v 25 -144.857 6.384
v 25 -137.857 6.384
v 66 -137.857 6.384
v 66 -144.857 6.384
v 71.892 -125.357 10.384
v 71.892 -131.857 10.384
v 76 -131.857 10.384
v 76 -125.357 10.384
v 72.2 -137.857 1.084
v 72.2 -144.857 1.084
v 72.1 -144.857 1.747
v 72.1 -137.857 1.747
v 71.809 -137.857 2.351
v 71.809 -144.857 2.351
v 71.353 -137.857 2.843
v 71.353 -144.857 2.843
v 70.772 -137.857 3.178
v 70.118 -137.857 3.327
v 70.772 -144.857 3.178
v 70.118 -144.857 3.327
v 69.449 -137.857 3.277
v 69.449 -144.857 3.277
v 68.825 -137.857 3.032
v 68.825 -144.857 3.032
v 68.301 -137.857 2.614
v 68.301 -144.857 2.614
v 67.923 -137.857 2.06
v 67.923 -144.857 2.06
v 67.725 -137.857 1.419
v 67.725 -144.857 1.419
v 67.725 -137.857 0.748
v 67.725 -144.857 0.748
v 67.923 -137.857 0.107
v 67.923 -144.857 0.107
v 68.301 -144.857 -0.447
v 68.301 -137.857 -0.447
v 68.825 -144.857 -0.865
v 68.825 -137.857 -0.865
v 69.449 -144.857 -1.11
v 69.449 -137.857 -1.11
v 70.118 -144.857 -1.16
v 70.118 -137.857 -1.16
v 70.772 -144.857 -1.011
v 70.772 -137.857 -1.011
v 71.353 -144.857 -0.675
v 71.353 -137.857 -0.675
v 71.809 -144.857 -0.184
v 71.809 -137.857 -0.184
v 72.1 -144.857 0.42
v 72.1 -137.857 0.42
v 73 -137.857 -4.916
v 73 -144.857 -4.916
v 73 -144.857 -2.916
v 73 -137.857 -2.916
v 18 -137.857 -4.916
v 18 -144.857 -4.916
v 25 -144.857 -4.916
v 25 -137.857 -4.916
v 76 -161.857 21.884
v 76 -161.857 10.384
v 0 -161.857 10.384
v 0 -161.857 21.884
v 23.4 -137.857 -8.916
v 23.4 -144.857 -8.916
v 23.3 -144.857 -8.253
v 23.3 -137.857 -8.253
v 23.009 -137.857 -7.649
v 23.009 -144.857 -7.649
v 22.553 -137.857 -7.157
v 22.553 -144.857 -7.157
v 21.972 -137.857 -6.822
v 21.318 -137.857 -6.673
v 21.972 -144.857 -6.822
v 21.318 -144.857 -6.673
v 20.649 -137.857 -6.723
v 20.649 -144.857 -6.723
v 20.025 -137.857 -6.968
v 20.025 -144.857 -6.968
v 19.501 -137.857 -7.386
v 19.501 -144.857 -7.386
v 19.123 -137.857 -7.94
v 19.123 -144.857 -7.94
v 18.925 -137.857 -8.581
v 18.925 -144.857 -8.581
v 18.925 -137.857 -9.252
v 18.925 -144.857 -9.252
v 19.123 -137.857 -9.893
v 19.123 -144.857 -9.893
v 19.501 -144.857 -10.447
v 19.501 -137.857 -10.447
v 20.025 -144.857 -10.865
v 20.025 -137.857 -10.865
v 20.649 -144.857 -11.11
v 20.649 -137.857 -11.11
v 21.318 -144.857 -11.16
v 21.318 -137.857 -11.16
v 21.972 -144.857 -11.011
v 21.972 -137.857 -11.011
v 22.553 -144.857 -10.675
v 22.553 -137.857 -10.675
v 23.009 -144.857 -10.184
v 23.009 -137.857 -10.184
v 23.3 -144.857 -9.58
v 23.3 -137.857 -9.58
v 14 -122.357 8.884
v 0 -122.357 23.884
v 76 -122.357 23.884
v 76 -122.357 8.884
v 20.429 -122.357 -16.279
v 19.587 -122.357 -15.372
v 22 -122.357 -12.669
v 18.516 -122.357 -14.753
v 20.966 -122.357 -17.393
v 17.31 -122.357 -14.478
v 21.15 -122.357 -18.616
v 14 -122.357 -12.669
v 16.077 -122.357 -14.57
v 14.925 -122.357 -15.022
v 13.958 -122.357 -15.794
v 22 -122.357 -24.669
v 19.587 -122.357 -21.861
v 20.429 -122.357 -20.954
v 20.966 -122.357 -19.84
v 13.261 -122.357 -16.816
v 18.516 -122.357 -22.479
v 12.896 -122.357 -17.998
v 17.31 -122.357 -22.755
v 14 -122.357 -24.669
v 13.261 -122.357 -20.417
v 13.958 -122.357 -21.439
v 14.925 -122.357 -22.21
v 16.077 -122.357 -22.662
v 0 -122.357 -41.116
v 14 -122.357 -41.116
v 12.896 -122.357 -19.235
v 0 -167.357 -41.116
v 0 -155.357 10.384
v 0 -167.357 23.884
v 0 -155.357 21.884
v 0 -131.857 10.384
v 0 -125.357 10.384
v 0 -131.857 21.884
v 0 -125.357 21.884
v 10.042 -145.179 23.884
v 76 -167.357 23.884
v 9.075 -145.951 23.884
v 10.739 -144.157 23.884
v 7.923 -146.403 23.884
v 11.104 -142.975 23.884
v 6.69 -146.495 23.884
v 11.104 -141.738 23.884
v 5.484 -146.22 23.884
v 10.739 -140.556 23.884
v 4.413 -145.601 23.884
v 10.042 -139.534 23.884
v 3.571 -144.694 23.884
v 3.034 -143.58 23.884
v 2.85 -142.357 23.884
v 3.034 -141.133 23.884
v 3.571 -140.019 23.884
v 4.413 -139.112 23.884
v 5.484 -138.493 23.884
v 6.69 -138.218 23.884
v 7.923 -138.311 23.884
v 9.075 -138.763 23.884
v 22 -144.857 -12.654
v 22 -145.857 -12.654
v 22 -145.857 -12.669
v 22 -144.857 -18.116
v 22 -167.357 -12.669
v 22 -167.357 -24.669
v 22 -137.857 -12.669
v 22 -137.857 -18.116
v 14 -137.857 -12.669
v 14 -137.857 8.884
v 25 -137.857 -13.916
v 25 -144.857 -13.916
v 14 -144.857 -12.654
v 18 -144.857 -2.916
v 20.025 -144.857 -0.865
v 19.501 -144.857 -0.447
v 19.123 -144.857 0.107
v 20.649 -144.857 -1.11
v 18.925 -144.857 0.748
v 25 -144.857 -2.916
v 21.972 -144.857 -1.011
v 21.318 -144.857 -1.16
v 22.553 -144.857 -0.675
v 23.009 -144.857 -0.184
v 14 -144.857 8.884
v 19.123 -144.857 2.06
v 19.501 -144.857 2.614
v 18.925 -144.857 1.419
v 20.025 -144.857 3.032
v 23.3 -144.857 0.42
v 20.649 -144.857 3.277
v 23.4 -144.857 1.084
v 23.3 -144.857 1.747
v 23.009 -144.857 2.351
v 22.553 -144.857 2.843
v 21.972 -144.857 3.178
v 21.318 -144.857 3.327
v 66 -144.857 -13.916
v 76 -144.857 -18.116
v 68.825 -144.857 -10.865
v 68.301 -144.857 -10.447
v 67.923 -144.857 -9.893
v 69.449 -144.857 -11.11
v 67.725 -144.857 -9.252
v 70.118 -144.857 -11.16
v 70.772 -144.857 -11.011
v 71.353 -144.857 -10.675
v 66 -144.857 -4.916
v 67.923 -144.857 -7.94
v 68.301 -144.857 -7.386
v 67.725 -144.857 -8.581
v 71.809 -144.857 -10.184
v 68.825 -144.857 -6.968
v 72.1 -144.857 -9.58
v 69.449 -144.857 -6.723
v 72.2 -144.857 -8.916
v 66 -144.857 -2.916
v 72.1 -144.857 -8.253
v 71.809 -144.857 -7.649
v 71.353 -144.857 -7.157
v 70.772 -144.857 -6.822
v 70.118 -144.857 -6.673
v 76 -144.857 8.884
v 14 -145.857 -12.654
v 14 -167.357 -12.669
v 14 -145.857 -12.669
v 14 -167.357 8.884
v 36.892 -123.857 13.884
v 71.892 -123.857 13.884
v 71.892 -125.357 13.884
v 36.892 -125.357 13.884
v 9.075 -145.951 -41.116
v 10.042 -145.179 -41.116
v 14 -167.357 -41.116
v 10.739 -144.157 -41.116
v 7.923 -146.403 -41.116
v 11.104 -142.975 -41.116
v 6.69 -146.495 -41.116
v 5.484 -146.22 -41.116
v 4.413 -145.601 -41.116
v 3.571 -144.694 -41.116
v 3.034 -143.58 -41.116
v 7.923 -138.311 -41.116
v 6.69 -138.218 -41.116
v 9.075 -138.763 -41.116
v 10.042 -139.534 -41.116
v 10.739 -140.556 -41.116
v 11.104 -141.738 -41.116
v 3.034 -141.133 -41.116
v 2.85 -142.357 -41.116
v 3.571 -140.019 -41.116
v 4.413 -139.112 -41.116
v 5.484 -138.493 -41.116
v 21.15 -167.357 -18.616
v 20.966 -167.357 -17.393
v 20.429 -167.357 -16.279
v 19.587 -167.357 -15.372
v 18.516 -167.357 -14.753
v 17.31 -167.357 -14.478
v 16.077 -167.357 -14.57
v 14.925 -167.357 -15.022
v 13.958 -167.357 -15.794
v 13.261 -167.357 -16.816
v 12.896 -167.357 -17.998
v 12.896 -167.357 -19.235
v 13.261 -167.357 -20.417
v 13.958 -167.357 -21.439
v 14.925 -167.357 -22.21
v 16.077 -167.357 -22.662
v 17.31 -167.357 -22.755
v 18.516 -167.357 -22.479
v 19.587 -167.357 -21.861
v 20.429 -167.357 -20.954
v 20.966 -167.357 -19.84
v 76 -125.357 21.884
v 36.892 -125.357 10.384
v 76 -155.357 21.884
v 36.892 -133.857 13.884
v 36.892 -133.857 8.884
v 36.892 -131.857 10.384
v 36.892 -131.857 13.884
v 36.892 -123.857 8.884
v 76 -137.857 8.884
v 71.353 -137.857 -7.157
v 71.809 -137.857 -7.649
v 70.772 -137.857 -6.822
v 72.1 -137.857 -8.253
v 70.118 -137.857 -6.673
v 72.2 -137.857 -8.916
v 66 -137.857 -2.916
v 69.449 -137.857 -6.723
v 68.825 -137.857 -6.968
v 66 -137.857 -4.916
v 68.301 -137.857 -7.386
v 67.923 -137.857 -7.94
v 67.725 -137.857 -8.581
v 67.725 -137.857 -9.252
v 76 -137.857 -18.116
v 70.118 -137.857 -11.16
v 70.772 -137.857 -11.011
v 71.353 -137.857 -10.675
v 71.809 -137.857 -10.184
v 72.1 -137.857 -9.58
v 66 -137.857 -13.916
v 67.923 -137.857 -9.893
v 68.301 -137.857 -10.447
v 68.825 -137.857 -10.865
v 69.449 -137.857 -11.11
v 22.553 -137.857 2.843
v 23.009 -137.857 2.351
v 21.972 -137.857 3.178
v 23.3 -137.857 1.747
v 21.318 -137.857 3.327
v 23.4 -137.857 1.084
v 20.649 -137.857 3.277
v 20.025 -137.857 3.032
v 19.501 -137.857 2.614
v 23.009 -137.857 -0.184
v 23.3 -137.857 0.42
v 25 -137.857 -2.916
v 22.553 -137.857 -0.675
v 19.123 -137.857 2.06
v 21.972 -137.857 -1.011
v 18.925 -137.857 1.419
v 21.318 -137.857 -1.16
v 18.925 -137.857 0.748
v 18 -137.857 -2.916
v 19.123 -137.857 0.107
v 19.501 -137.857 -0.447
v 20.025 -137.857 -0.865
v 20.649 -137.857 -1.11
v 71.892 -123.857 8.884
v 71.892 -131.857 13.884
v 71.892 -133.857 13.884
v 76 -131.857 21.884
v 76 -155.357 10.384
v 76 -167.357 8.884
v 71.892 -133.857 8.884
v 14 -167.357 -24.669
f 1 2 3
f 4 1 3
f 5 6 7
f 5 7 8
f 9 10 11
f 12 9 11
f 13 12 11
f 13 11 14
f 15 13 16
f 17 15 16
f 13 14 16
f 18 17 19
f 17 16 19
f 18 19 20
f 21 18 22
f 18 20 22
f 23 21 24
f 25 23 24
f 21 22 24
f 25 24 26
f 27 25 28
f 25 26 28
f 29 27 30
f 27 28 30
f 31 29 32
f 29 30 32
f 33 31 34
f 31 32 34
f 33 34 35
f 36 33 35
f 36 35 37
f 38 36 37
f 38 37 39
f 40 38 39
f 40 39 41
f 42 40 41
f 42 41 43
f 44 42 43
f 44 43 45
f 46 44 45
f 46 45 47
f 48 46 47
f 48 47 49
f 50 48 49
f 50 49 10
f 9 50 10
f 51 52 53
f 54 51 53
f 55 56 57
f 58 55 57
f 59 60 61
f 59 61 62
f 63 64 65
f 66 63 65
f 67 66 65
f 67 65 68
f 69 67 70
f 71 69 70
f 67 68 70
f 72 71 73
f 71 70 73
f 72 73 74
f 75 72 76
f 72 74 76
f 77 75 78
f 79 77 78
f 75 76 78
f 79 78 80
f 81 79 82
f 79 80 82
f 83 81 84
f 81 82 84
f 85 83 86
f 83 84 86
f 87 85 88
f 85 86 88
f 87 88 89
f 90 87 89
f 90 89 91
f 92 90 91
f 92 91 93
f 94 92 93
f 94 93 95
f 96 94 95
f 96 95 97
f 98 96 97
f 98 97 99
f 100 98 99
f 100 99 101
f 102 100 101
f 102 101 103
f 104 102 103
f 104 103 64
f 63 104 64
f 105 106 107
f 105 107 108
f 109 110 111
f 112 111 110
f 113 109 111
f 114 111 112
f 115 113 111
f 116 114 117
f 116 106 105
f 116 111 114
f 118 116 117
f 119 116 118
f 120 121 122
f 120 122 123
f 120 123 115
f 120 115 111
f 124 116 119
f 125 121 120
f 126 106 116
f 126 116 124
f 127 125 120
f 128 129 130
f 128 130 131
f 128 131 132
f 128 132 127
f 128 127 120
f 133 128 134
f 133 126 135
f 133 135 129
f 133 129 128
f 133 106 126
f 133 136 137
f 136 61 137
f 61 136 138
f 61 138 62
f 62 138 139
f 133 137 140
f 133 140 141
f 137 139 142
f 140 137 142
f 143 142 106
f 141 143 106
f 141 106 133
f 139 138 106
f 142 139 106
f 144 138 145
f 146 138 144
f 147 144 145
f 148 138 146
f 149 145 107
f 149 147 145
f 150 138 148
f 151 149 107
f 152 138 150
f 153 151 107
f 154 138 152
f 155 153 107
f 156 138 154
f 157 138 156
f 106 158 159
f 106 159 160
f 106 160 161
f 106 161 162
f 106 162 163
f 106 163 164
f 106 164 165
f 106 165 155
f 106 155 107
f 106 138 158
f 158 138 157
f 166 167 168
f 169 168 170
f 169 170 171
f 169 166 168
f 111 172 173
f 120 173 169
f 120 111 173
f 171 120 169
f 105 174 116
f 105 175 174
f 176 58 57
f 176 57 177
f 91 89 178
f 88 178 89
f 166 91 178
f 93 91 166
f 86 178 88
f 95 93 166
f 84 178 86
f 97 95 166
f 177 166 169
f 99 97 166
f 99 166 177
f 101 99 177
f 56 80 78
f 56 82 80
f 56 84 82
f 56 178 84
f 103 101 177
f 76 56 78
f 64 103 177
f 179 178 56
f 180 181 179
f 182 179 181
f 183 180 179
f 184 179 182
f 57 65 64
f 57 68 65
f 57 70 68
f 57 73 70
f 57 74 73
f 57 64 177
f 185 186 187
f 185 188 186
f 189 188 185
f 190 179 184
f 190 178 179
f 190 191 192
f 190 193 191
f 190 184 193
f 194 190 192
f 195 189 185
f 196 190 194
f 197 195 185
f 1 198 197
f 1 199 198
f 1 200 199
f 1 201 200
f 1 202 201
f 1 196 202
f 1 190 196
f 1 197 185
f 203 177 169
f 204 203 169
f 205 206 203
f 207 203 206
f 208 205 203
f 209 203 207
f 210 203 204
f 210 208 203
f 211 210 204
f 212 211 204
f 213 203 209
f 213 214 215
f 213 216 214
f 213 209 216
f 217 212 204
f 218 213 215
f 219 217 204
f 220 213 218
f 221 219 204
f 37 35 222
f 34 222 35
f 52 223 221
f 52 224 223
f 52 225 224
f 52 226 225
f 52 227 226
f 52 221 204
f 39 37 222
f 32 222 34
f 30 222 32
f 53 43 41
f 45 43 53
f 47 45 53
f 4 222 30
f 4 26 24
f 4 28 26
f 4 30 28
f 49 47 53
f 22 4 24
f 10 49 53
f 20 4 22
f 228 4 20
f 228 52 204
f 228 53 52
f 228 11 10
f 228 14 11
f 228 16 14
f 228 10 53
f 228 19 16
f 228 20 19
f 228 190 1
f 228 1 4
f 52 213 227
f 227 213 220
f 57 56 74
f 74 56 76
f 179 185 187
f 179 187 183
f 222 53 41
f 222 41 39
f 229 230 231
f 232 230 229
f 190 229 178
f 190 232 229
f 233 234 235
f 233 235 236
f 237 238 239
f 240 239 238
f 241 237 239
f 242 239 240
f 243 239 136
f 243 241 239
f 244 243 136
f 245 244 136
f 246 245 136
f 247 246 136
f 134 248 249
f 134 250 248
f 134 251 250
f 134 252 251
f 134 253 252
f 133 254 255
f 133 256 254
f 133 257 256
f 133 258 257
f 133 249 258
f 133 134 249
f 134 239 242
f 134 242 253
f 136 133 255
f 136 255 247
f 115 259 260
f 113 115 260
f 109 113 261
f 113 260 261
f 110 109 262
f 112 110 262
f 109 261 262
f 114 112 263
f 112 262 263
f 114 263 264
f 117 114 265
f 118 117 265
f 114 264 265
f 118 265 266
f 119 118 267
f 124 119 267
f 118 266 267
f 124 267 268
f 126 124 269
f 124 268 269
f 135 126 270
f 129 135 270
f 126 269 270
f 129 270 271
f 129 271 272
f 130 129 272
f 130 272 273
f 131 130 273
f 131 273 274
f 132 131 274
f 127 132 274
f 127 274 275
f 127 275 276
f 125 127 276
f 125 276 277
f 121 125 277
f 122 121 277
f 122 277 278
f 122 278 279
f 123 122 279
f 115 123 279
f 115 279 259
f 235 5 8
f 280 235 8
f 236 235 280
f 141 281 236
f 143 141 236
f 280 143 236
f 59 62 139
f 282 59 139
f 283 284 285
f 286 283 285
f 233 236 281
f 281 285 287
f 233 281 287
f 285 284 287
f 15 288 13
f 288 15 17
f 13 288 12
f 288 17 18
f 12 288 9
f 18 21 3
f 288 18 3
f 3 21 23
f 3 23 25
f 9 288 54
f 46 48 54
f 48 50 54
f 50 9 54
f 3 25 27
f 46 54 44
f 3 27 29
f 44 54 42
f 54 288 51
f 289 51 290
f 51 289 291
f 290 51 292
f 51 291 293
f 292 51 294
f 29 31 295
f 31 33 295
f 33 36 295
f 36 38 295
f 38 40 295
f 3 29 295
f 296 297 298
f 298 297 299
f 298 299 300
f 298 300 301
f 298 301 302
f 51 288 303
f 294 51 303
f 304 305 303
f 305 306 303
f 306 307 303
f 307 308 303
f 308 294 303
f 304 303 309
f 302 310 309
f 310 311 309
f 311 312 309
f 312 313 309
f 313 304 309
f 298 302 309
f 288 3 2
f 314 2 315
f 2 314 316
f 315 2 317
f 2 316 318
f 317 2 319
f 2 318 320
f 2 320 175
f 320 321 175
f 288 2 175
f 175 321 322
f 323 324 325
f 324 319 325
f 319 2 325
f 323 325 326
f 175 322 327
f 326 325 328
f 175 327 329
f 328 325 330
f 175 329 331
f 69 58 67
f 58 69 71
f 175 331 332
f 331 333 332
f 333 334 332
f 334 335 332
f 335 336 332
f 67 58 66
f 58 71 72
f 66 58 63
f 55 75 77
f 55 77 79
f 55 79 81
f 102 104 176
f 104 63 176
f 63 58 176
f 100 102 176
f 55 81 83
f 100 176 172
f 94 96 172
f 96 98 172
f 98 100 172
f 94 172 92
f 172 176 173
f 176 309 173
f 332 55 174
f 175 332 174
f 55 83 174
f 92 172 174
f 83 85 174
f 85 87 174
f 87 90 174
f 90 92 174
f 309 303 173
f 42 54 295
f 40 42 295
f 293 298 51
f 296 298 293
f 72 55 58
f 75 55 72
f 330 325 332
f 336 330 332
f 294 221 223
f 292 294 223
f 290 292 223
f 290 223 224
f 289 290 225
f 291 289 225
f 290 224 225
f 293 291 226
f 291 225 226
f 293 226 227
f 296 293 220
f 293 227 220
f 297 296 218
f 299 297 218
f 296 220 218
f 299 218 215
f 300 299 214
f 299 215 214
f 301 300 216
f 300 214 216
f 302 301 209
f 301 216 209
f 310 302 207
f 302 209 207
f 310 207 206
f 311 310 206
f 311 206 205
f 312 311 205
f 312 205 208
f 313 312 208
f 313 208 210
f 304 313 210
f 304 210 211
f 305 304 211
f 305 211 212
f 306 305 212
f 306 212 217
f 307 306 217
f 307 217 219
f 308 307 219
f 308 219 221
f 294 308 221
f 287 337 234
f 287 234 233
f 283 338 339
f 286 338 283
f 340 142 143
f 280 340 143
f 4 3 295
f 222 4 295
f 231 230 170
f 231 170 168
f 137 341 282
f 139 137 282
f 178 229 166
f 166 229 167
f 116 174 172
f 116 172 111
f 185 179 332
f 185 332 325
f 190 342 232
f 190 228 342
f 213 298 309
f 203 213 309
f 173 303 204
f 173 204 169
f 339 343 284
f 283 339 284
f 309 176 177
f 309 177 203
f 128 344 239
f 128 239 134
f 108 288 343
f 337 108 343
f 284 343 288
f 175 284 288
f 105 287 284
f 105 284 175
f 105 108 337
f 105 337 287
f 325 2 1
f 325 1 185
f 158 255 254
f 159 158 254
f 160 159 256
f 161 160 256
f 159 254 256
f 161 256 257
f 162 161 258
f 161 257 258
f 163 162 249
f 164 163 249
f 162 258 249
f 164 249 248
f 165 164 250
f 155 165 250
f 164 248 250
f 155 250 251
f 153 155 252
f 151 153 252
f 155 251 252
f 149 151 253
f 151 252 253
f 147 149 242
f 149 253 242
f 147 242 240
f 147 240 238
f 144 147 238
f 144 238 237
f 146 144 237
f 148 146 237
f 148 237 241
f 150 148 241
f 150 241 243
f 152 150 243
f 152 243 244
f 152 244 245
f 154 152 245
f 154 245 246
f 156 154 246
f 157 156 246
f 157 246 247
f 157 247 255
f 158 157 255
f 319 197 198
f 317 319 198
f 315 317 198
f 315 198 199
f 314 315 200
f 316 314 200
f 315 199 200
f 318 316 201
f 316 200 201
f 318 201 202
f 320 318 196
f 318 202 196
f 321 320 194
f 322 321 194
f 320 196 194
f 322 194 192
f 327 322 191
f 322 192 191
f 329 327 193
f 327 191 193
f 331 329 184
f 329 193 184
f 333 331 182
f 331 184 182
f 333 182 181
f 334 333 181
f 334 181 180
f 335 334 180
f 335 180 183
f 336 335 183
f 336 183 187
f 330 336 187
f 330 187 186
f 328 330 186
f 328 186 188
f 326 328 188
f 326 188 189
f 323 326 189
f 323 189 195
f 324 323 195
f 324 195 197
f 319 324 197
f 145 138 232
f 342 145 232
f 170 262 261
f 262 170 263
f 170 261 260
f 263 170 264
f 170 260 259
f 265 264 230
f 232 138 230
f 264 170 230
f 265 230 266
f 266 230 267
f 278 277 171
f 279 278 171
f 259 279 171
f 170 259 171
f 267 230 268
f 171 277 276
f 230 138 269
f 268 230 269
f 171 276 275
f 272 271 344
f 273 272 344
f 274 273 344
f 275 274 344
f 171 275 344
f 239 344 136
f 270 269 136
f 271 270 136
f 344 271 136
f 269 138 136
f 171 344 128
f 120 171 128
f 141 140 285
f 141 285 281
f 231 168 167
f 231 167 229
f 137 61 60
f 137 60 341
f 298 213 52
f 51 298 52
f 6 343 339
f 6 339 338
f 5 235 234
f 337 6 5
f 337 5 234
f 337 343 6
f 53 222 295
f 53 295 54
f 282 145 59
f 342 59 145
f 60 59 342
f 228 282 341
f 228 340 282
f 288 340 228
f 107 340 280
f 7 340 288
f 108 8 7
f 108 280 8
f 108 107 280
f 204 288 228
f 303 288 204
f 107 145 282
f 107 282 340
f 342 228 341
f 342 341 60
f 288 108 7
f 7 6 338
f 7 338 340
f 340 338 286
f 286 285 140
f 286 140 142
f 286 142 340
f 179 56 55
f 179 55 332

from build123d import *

# Parameters (mm, degrees)
SKETCH_1_W           = 45
SKETCH_1_H           = 45
EXTRUDE_1_DEPTH      = 100
SKETCH_2_OUTSIDE_W   = 125.706
SKETCH_2_OUTSIDE_H   = 70.706
SKETCH_2_OUTSIDE_W_2 = 62
SKETCH_2_OUTSIDE_H_2 = 8
CUT_EXTRUDE_1_DEPTH  = 30
SKETCH_3_W           = 41
SKETCH_3_H           = 20.3
CUT_EXTRUDE_2_DEPTH  = 30.5
SKETCH_5_W           = 11.5
SKETCH_5_H           = 6.5
CUT_EXTRUDE_3_DEPTH  = 101
SKETCH_7_R           = 2.25
SKETCH_7_W           = 7
SKETCH_7_H           = 2
CUT_EXTRUDE_5_DEPTH  = 10
SKETCH_9_W           = 62
SKETCH_9_H           = 8
CUT_EXTRUDE_7_DEPTH  = 3
SKETCH_10_W          = 15
SKETCH_10_H          = 45
CUT_EXTRUDE_8_DEPTH  = 24
SKETCH_13_W          = 14
SKETCH_13_H          = 45
EXTRUDE_3_DEPTH      = 50
SKETCH_14_R          = 4.15
CUT_EXTRUDE_9_DEPTH  = 66
SKETCH_15_W          = 12
SKETCH_15_H          = 45
EXTRUDE_4_DEPTH      = 8
SKETCH_17_R          = 4.15
CUT_EXTRUDE_11_DEPTH = 46
SKETCH_8_W           = 35
SKETCH_8_H           = 10
CUT_EXTRUDE_12_DEPTH = 5
CUT_EXTRUDE_14_DEPTH = 1


with BuildPart() as part:
    # 草图1 → 凸台-拉伸1 (new body)
    with BuildSketch(Plane(origin=(0, 0, 0), x_dir=(0, 0, -1), z_dir=(1, 0, 0))):
        with Locations((-1.383662758, -144.856597142)):
            Rectangle(SKETCH_1_W, SKETCH_1_H)
    extrude(amount=EXTRUDE_1_DEPTH)

    # 草图2 outside → 切除-拉伸1 (cut)
    with BuildSketch(Plane(origin=(0, 0, -21.116337242), x_dir=(-1, 0, 0), z_dir=(0, 0, -1))):
        with Locations((-50, -144.857)):
            Rectangle(SKETCH_2_OUTSIDE_W, SKETCH_2_OUTSIDE_H)
        with Locations((-45, -141.856597142)):
            Rectangle(SKETCH_2_OUTSIDE_W_2, SKETCH_2_OUTSIDE_H_2, mode=Mode.SUBTRACT)
    extrude(amount=-CUT_EXTRUDE_1_DEPTH, mode=Mode.SUBTRACT)

    # 草图3 → 切除-拉伸2 (cut, through all)
    with BuildSketch(Plane(origin=(0, -137.856597142, 0), x_dir=(1, 0, 0), z_dir=(0, 1, 0))):
        with Locations((45.5, 3.766337242)):
            Rectangle(SKETCH_3_W, SKETCH_3_H)
    extrude(amount=-CUT_EXTRUDE_2_DEPTH, mode=Mode.SUBTRACT)

    # 草图5 → 切除-拉伸3 (cut, through all)
    with BuildSketch(Plane.ZY):
        with Locations((16.133662758, -128.606597142)):
            Rectangle(SKETCH_5_W, SKETCH_5_H)
        with Locations((16.133662758, -158.606597142)):
            Rectangle(SKETCH_5_W, SKETCH_5_H)
    extrude(amount=-CUT_EXTRUDE_3_DEPTH, mode=Mode.SUBTRACT)

    # 草图7 → 切除-拉伸5 (cut)
    with BuildSketch(Plane.XZ.offset(145.856597142)):
        with Locations((21.15, -8.916337242)):
            Circle(SKETCH_7_R)
        with Locations((21.15, 1.083662758)):
            Circle(SKETCH_7_R)
        with Locations((69.95, -8.916337242)):
            Circle(SKETCH_7_R)
        with Locations((69.95, 1.083662758)):
            Circle(SKETCH_7_R)
        with Locations((21.5, -3.916337242)):
            Rectangle(SKETCH_7_W, SKETCH_7_H)
        with Locations((69.5, -3.916337242)):
            Rectangle(SKETCH_7_W, SKETCH_7_H)
    extrude(amount=-CUT_EXTRUDE_5_DEPTH, mode=Mode.SUBTRACT)

    # 草图9 → 切除-拉伸7 (cut)
    with BuildSketch(Plane(origin=(0, 0, -21.116337242), x_dir=(-1, 0, 0), z_dir=(0, 0, -1))):
        with Locations((-45, -141.856597142)):
            Rectangle(SKETCH_9_W, SKETCH_9_H)
    extrude(amount=-CUT_EXTRUDE_7_DEPTH, mode=Mode.SUBTRACT)

    # 草图10 → 切除-拉伸8 (cut)
    with BuildSketch(Plane(origin=(100, 0, 0), x_dir=(0, 0, -1), z_dir=(1, 0, 0))):
        with Locations((-16.383662758, -144.856597142)):
            Rectangle(SKETCH_10_W, SKETCH_10_H)
    extrude(amount=-CUT_EXTRUDE_8_DEPTH, mode=Mode.SUBTRACT)

    # 草图13 → 凸台-拉伸3 (add)
    with BuildSketch(Plane(origin=(0, 0, 8.883662758), x_dir=(-1, 0, 0), z_dir=(0, 0, -1))):
        with Locations((-7, -144.856597142)):
            Rectangle(SKETCH_13_W, SKETCH_13_H)
    extrude(amount=EXTRUDE_3_DEPTH)

    # 草图14 → 切除-拉伸9 (cut, through all)
    with BuildSketch(Plane(origin=(0, 0, -41.116337242), x_dir=(-1, 0, 0), z_dir=(0, 0, -1))):
        with Locations((-7, -142.356597142)):
            Circle(SKETCH_14_R)
    extrude(amount=-CUT_EXTRUDE_9_DEPTH, mode=Mode.SUBTRACT)

    # 草图15 → 凸台-拉伸4 (add)
    with BuildSketch(Plane(origin=(14, 0, 0), x_dir=(0, 0, -1), z_dir=(1, 0, 0))):
        with Locations((18.668900169, -144.856597142)):
            Rectangle(SKETCH_15_W, SKETCH_15_H)
    extrude(amount=EXTRUDE_4_DEPTH)

    # 草图17 → 切除-拉伸11 (cut, through all)
    with BuildSketch(Plane.XZ.offset(167.356597142)):
        with Locations((17, -18.616337242)):
            Circle(SKETCH_17_R)
    extrude(amount=-CUT_EXTRUDE_11_DEPTH, mode=Mode.SUBTRACT)

    # 草图8 → 切除-拉伸12 (cut)
    with BuildSketch(Plane(origin=(0, 0, 8.883662758), x_dir=(-1, 0, 0), z_dir=(0, 0, -1))):
        with Locations((-54.391773718, -128.856597142)):
            Rectangle(SKETCH_8_W, SKETCH_8_H)
    extrude(amount=-CUT_EXTRUDE_12_DEPTH, mode=Mode.SUBTRACT)

    # 草图18 → 切除-拉伸14 (cut)
    with BuildSketch(Plane.XZ.offset(145.856597142)):
        Polygon((76, 8.883662758), (22, 8.883662758), (14, 8.883662758), (14, -12.654298783), (22, -12.654298783), (22, -18.116337242), (76, -18.116337242), align=None)
    extrude(amount=-CUT_EXTRUDE_14_DEPTH, mode=Mode.SUBTRACT)


solid = part.part
